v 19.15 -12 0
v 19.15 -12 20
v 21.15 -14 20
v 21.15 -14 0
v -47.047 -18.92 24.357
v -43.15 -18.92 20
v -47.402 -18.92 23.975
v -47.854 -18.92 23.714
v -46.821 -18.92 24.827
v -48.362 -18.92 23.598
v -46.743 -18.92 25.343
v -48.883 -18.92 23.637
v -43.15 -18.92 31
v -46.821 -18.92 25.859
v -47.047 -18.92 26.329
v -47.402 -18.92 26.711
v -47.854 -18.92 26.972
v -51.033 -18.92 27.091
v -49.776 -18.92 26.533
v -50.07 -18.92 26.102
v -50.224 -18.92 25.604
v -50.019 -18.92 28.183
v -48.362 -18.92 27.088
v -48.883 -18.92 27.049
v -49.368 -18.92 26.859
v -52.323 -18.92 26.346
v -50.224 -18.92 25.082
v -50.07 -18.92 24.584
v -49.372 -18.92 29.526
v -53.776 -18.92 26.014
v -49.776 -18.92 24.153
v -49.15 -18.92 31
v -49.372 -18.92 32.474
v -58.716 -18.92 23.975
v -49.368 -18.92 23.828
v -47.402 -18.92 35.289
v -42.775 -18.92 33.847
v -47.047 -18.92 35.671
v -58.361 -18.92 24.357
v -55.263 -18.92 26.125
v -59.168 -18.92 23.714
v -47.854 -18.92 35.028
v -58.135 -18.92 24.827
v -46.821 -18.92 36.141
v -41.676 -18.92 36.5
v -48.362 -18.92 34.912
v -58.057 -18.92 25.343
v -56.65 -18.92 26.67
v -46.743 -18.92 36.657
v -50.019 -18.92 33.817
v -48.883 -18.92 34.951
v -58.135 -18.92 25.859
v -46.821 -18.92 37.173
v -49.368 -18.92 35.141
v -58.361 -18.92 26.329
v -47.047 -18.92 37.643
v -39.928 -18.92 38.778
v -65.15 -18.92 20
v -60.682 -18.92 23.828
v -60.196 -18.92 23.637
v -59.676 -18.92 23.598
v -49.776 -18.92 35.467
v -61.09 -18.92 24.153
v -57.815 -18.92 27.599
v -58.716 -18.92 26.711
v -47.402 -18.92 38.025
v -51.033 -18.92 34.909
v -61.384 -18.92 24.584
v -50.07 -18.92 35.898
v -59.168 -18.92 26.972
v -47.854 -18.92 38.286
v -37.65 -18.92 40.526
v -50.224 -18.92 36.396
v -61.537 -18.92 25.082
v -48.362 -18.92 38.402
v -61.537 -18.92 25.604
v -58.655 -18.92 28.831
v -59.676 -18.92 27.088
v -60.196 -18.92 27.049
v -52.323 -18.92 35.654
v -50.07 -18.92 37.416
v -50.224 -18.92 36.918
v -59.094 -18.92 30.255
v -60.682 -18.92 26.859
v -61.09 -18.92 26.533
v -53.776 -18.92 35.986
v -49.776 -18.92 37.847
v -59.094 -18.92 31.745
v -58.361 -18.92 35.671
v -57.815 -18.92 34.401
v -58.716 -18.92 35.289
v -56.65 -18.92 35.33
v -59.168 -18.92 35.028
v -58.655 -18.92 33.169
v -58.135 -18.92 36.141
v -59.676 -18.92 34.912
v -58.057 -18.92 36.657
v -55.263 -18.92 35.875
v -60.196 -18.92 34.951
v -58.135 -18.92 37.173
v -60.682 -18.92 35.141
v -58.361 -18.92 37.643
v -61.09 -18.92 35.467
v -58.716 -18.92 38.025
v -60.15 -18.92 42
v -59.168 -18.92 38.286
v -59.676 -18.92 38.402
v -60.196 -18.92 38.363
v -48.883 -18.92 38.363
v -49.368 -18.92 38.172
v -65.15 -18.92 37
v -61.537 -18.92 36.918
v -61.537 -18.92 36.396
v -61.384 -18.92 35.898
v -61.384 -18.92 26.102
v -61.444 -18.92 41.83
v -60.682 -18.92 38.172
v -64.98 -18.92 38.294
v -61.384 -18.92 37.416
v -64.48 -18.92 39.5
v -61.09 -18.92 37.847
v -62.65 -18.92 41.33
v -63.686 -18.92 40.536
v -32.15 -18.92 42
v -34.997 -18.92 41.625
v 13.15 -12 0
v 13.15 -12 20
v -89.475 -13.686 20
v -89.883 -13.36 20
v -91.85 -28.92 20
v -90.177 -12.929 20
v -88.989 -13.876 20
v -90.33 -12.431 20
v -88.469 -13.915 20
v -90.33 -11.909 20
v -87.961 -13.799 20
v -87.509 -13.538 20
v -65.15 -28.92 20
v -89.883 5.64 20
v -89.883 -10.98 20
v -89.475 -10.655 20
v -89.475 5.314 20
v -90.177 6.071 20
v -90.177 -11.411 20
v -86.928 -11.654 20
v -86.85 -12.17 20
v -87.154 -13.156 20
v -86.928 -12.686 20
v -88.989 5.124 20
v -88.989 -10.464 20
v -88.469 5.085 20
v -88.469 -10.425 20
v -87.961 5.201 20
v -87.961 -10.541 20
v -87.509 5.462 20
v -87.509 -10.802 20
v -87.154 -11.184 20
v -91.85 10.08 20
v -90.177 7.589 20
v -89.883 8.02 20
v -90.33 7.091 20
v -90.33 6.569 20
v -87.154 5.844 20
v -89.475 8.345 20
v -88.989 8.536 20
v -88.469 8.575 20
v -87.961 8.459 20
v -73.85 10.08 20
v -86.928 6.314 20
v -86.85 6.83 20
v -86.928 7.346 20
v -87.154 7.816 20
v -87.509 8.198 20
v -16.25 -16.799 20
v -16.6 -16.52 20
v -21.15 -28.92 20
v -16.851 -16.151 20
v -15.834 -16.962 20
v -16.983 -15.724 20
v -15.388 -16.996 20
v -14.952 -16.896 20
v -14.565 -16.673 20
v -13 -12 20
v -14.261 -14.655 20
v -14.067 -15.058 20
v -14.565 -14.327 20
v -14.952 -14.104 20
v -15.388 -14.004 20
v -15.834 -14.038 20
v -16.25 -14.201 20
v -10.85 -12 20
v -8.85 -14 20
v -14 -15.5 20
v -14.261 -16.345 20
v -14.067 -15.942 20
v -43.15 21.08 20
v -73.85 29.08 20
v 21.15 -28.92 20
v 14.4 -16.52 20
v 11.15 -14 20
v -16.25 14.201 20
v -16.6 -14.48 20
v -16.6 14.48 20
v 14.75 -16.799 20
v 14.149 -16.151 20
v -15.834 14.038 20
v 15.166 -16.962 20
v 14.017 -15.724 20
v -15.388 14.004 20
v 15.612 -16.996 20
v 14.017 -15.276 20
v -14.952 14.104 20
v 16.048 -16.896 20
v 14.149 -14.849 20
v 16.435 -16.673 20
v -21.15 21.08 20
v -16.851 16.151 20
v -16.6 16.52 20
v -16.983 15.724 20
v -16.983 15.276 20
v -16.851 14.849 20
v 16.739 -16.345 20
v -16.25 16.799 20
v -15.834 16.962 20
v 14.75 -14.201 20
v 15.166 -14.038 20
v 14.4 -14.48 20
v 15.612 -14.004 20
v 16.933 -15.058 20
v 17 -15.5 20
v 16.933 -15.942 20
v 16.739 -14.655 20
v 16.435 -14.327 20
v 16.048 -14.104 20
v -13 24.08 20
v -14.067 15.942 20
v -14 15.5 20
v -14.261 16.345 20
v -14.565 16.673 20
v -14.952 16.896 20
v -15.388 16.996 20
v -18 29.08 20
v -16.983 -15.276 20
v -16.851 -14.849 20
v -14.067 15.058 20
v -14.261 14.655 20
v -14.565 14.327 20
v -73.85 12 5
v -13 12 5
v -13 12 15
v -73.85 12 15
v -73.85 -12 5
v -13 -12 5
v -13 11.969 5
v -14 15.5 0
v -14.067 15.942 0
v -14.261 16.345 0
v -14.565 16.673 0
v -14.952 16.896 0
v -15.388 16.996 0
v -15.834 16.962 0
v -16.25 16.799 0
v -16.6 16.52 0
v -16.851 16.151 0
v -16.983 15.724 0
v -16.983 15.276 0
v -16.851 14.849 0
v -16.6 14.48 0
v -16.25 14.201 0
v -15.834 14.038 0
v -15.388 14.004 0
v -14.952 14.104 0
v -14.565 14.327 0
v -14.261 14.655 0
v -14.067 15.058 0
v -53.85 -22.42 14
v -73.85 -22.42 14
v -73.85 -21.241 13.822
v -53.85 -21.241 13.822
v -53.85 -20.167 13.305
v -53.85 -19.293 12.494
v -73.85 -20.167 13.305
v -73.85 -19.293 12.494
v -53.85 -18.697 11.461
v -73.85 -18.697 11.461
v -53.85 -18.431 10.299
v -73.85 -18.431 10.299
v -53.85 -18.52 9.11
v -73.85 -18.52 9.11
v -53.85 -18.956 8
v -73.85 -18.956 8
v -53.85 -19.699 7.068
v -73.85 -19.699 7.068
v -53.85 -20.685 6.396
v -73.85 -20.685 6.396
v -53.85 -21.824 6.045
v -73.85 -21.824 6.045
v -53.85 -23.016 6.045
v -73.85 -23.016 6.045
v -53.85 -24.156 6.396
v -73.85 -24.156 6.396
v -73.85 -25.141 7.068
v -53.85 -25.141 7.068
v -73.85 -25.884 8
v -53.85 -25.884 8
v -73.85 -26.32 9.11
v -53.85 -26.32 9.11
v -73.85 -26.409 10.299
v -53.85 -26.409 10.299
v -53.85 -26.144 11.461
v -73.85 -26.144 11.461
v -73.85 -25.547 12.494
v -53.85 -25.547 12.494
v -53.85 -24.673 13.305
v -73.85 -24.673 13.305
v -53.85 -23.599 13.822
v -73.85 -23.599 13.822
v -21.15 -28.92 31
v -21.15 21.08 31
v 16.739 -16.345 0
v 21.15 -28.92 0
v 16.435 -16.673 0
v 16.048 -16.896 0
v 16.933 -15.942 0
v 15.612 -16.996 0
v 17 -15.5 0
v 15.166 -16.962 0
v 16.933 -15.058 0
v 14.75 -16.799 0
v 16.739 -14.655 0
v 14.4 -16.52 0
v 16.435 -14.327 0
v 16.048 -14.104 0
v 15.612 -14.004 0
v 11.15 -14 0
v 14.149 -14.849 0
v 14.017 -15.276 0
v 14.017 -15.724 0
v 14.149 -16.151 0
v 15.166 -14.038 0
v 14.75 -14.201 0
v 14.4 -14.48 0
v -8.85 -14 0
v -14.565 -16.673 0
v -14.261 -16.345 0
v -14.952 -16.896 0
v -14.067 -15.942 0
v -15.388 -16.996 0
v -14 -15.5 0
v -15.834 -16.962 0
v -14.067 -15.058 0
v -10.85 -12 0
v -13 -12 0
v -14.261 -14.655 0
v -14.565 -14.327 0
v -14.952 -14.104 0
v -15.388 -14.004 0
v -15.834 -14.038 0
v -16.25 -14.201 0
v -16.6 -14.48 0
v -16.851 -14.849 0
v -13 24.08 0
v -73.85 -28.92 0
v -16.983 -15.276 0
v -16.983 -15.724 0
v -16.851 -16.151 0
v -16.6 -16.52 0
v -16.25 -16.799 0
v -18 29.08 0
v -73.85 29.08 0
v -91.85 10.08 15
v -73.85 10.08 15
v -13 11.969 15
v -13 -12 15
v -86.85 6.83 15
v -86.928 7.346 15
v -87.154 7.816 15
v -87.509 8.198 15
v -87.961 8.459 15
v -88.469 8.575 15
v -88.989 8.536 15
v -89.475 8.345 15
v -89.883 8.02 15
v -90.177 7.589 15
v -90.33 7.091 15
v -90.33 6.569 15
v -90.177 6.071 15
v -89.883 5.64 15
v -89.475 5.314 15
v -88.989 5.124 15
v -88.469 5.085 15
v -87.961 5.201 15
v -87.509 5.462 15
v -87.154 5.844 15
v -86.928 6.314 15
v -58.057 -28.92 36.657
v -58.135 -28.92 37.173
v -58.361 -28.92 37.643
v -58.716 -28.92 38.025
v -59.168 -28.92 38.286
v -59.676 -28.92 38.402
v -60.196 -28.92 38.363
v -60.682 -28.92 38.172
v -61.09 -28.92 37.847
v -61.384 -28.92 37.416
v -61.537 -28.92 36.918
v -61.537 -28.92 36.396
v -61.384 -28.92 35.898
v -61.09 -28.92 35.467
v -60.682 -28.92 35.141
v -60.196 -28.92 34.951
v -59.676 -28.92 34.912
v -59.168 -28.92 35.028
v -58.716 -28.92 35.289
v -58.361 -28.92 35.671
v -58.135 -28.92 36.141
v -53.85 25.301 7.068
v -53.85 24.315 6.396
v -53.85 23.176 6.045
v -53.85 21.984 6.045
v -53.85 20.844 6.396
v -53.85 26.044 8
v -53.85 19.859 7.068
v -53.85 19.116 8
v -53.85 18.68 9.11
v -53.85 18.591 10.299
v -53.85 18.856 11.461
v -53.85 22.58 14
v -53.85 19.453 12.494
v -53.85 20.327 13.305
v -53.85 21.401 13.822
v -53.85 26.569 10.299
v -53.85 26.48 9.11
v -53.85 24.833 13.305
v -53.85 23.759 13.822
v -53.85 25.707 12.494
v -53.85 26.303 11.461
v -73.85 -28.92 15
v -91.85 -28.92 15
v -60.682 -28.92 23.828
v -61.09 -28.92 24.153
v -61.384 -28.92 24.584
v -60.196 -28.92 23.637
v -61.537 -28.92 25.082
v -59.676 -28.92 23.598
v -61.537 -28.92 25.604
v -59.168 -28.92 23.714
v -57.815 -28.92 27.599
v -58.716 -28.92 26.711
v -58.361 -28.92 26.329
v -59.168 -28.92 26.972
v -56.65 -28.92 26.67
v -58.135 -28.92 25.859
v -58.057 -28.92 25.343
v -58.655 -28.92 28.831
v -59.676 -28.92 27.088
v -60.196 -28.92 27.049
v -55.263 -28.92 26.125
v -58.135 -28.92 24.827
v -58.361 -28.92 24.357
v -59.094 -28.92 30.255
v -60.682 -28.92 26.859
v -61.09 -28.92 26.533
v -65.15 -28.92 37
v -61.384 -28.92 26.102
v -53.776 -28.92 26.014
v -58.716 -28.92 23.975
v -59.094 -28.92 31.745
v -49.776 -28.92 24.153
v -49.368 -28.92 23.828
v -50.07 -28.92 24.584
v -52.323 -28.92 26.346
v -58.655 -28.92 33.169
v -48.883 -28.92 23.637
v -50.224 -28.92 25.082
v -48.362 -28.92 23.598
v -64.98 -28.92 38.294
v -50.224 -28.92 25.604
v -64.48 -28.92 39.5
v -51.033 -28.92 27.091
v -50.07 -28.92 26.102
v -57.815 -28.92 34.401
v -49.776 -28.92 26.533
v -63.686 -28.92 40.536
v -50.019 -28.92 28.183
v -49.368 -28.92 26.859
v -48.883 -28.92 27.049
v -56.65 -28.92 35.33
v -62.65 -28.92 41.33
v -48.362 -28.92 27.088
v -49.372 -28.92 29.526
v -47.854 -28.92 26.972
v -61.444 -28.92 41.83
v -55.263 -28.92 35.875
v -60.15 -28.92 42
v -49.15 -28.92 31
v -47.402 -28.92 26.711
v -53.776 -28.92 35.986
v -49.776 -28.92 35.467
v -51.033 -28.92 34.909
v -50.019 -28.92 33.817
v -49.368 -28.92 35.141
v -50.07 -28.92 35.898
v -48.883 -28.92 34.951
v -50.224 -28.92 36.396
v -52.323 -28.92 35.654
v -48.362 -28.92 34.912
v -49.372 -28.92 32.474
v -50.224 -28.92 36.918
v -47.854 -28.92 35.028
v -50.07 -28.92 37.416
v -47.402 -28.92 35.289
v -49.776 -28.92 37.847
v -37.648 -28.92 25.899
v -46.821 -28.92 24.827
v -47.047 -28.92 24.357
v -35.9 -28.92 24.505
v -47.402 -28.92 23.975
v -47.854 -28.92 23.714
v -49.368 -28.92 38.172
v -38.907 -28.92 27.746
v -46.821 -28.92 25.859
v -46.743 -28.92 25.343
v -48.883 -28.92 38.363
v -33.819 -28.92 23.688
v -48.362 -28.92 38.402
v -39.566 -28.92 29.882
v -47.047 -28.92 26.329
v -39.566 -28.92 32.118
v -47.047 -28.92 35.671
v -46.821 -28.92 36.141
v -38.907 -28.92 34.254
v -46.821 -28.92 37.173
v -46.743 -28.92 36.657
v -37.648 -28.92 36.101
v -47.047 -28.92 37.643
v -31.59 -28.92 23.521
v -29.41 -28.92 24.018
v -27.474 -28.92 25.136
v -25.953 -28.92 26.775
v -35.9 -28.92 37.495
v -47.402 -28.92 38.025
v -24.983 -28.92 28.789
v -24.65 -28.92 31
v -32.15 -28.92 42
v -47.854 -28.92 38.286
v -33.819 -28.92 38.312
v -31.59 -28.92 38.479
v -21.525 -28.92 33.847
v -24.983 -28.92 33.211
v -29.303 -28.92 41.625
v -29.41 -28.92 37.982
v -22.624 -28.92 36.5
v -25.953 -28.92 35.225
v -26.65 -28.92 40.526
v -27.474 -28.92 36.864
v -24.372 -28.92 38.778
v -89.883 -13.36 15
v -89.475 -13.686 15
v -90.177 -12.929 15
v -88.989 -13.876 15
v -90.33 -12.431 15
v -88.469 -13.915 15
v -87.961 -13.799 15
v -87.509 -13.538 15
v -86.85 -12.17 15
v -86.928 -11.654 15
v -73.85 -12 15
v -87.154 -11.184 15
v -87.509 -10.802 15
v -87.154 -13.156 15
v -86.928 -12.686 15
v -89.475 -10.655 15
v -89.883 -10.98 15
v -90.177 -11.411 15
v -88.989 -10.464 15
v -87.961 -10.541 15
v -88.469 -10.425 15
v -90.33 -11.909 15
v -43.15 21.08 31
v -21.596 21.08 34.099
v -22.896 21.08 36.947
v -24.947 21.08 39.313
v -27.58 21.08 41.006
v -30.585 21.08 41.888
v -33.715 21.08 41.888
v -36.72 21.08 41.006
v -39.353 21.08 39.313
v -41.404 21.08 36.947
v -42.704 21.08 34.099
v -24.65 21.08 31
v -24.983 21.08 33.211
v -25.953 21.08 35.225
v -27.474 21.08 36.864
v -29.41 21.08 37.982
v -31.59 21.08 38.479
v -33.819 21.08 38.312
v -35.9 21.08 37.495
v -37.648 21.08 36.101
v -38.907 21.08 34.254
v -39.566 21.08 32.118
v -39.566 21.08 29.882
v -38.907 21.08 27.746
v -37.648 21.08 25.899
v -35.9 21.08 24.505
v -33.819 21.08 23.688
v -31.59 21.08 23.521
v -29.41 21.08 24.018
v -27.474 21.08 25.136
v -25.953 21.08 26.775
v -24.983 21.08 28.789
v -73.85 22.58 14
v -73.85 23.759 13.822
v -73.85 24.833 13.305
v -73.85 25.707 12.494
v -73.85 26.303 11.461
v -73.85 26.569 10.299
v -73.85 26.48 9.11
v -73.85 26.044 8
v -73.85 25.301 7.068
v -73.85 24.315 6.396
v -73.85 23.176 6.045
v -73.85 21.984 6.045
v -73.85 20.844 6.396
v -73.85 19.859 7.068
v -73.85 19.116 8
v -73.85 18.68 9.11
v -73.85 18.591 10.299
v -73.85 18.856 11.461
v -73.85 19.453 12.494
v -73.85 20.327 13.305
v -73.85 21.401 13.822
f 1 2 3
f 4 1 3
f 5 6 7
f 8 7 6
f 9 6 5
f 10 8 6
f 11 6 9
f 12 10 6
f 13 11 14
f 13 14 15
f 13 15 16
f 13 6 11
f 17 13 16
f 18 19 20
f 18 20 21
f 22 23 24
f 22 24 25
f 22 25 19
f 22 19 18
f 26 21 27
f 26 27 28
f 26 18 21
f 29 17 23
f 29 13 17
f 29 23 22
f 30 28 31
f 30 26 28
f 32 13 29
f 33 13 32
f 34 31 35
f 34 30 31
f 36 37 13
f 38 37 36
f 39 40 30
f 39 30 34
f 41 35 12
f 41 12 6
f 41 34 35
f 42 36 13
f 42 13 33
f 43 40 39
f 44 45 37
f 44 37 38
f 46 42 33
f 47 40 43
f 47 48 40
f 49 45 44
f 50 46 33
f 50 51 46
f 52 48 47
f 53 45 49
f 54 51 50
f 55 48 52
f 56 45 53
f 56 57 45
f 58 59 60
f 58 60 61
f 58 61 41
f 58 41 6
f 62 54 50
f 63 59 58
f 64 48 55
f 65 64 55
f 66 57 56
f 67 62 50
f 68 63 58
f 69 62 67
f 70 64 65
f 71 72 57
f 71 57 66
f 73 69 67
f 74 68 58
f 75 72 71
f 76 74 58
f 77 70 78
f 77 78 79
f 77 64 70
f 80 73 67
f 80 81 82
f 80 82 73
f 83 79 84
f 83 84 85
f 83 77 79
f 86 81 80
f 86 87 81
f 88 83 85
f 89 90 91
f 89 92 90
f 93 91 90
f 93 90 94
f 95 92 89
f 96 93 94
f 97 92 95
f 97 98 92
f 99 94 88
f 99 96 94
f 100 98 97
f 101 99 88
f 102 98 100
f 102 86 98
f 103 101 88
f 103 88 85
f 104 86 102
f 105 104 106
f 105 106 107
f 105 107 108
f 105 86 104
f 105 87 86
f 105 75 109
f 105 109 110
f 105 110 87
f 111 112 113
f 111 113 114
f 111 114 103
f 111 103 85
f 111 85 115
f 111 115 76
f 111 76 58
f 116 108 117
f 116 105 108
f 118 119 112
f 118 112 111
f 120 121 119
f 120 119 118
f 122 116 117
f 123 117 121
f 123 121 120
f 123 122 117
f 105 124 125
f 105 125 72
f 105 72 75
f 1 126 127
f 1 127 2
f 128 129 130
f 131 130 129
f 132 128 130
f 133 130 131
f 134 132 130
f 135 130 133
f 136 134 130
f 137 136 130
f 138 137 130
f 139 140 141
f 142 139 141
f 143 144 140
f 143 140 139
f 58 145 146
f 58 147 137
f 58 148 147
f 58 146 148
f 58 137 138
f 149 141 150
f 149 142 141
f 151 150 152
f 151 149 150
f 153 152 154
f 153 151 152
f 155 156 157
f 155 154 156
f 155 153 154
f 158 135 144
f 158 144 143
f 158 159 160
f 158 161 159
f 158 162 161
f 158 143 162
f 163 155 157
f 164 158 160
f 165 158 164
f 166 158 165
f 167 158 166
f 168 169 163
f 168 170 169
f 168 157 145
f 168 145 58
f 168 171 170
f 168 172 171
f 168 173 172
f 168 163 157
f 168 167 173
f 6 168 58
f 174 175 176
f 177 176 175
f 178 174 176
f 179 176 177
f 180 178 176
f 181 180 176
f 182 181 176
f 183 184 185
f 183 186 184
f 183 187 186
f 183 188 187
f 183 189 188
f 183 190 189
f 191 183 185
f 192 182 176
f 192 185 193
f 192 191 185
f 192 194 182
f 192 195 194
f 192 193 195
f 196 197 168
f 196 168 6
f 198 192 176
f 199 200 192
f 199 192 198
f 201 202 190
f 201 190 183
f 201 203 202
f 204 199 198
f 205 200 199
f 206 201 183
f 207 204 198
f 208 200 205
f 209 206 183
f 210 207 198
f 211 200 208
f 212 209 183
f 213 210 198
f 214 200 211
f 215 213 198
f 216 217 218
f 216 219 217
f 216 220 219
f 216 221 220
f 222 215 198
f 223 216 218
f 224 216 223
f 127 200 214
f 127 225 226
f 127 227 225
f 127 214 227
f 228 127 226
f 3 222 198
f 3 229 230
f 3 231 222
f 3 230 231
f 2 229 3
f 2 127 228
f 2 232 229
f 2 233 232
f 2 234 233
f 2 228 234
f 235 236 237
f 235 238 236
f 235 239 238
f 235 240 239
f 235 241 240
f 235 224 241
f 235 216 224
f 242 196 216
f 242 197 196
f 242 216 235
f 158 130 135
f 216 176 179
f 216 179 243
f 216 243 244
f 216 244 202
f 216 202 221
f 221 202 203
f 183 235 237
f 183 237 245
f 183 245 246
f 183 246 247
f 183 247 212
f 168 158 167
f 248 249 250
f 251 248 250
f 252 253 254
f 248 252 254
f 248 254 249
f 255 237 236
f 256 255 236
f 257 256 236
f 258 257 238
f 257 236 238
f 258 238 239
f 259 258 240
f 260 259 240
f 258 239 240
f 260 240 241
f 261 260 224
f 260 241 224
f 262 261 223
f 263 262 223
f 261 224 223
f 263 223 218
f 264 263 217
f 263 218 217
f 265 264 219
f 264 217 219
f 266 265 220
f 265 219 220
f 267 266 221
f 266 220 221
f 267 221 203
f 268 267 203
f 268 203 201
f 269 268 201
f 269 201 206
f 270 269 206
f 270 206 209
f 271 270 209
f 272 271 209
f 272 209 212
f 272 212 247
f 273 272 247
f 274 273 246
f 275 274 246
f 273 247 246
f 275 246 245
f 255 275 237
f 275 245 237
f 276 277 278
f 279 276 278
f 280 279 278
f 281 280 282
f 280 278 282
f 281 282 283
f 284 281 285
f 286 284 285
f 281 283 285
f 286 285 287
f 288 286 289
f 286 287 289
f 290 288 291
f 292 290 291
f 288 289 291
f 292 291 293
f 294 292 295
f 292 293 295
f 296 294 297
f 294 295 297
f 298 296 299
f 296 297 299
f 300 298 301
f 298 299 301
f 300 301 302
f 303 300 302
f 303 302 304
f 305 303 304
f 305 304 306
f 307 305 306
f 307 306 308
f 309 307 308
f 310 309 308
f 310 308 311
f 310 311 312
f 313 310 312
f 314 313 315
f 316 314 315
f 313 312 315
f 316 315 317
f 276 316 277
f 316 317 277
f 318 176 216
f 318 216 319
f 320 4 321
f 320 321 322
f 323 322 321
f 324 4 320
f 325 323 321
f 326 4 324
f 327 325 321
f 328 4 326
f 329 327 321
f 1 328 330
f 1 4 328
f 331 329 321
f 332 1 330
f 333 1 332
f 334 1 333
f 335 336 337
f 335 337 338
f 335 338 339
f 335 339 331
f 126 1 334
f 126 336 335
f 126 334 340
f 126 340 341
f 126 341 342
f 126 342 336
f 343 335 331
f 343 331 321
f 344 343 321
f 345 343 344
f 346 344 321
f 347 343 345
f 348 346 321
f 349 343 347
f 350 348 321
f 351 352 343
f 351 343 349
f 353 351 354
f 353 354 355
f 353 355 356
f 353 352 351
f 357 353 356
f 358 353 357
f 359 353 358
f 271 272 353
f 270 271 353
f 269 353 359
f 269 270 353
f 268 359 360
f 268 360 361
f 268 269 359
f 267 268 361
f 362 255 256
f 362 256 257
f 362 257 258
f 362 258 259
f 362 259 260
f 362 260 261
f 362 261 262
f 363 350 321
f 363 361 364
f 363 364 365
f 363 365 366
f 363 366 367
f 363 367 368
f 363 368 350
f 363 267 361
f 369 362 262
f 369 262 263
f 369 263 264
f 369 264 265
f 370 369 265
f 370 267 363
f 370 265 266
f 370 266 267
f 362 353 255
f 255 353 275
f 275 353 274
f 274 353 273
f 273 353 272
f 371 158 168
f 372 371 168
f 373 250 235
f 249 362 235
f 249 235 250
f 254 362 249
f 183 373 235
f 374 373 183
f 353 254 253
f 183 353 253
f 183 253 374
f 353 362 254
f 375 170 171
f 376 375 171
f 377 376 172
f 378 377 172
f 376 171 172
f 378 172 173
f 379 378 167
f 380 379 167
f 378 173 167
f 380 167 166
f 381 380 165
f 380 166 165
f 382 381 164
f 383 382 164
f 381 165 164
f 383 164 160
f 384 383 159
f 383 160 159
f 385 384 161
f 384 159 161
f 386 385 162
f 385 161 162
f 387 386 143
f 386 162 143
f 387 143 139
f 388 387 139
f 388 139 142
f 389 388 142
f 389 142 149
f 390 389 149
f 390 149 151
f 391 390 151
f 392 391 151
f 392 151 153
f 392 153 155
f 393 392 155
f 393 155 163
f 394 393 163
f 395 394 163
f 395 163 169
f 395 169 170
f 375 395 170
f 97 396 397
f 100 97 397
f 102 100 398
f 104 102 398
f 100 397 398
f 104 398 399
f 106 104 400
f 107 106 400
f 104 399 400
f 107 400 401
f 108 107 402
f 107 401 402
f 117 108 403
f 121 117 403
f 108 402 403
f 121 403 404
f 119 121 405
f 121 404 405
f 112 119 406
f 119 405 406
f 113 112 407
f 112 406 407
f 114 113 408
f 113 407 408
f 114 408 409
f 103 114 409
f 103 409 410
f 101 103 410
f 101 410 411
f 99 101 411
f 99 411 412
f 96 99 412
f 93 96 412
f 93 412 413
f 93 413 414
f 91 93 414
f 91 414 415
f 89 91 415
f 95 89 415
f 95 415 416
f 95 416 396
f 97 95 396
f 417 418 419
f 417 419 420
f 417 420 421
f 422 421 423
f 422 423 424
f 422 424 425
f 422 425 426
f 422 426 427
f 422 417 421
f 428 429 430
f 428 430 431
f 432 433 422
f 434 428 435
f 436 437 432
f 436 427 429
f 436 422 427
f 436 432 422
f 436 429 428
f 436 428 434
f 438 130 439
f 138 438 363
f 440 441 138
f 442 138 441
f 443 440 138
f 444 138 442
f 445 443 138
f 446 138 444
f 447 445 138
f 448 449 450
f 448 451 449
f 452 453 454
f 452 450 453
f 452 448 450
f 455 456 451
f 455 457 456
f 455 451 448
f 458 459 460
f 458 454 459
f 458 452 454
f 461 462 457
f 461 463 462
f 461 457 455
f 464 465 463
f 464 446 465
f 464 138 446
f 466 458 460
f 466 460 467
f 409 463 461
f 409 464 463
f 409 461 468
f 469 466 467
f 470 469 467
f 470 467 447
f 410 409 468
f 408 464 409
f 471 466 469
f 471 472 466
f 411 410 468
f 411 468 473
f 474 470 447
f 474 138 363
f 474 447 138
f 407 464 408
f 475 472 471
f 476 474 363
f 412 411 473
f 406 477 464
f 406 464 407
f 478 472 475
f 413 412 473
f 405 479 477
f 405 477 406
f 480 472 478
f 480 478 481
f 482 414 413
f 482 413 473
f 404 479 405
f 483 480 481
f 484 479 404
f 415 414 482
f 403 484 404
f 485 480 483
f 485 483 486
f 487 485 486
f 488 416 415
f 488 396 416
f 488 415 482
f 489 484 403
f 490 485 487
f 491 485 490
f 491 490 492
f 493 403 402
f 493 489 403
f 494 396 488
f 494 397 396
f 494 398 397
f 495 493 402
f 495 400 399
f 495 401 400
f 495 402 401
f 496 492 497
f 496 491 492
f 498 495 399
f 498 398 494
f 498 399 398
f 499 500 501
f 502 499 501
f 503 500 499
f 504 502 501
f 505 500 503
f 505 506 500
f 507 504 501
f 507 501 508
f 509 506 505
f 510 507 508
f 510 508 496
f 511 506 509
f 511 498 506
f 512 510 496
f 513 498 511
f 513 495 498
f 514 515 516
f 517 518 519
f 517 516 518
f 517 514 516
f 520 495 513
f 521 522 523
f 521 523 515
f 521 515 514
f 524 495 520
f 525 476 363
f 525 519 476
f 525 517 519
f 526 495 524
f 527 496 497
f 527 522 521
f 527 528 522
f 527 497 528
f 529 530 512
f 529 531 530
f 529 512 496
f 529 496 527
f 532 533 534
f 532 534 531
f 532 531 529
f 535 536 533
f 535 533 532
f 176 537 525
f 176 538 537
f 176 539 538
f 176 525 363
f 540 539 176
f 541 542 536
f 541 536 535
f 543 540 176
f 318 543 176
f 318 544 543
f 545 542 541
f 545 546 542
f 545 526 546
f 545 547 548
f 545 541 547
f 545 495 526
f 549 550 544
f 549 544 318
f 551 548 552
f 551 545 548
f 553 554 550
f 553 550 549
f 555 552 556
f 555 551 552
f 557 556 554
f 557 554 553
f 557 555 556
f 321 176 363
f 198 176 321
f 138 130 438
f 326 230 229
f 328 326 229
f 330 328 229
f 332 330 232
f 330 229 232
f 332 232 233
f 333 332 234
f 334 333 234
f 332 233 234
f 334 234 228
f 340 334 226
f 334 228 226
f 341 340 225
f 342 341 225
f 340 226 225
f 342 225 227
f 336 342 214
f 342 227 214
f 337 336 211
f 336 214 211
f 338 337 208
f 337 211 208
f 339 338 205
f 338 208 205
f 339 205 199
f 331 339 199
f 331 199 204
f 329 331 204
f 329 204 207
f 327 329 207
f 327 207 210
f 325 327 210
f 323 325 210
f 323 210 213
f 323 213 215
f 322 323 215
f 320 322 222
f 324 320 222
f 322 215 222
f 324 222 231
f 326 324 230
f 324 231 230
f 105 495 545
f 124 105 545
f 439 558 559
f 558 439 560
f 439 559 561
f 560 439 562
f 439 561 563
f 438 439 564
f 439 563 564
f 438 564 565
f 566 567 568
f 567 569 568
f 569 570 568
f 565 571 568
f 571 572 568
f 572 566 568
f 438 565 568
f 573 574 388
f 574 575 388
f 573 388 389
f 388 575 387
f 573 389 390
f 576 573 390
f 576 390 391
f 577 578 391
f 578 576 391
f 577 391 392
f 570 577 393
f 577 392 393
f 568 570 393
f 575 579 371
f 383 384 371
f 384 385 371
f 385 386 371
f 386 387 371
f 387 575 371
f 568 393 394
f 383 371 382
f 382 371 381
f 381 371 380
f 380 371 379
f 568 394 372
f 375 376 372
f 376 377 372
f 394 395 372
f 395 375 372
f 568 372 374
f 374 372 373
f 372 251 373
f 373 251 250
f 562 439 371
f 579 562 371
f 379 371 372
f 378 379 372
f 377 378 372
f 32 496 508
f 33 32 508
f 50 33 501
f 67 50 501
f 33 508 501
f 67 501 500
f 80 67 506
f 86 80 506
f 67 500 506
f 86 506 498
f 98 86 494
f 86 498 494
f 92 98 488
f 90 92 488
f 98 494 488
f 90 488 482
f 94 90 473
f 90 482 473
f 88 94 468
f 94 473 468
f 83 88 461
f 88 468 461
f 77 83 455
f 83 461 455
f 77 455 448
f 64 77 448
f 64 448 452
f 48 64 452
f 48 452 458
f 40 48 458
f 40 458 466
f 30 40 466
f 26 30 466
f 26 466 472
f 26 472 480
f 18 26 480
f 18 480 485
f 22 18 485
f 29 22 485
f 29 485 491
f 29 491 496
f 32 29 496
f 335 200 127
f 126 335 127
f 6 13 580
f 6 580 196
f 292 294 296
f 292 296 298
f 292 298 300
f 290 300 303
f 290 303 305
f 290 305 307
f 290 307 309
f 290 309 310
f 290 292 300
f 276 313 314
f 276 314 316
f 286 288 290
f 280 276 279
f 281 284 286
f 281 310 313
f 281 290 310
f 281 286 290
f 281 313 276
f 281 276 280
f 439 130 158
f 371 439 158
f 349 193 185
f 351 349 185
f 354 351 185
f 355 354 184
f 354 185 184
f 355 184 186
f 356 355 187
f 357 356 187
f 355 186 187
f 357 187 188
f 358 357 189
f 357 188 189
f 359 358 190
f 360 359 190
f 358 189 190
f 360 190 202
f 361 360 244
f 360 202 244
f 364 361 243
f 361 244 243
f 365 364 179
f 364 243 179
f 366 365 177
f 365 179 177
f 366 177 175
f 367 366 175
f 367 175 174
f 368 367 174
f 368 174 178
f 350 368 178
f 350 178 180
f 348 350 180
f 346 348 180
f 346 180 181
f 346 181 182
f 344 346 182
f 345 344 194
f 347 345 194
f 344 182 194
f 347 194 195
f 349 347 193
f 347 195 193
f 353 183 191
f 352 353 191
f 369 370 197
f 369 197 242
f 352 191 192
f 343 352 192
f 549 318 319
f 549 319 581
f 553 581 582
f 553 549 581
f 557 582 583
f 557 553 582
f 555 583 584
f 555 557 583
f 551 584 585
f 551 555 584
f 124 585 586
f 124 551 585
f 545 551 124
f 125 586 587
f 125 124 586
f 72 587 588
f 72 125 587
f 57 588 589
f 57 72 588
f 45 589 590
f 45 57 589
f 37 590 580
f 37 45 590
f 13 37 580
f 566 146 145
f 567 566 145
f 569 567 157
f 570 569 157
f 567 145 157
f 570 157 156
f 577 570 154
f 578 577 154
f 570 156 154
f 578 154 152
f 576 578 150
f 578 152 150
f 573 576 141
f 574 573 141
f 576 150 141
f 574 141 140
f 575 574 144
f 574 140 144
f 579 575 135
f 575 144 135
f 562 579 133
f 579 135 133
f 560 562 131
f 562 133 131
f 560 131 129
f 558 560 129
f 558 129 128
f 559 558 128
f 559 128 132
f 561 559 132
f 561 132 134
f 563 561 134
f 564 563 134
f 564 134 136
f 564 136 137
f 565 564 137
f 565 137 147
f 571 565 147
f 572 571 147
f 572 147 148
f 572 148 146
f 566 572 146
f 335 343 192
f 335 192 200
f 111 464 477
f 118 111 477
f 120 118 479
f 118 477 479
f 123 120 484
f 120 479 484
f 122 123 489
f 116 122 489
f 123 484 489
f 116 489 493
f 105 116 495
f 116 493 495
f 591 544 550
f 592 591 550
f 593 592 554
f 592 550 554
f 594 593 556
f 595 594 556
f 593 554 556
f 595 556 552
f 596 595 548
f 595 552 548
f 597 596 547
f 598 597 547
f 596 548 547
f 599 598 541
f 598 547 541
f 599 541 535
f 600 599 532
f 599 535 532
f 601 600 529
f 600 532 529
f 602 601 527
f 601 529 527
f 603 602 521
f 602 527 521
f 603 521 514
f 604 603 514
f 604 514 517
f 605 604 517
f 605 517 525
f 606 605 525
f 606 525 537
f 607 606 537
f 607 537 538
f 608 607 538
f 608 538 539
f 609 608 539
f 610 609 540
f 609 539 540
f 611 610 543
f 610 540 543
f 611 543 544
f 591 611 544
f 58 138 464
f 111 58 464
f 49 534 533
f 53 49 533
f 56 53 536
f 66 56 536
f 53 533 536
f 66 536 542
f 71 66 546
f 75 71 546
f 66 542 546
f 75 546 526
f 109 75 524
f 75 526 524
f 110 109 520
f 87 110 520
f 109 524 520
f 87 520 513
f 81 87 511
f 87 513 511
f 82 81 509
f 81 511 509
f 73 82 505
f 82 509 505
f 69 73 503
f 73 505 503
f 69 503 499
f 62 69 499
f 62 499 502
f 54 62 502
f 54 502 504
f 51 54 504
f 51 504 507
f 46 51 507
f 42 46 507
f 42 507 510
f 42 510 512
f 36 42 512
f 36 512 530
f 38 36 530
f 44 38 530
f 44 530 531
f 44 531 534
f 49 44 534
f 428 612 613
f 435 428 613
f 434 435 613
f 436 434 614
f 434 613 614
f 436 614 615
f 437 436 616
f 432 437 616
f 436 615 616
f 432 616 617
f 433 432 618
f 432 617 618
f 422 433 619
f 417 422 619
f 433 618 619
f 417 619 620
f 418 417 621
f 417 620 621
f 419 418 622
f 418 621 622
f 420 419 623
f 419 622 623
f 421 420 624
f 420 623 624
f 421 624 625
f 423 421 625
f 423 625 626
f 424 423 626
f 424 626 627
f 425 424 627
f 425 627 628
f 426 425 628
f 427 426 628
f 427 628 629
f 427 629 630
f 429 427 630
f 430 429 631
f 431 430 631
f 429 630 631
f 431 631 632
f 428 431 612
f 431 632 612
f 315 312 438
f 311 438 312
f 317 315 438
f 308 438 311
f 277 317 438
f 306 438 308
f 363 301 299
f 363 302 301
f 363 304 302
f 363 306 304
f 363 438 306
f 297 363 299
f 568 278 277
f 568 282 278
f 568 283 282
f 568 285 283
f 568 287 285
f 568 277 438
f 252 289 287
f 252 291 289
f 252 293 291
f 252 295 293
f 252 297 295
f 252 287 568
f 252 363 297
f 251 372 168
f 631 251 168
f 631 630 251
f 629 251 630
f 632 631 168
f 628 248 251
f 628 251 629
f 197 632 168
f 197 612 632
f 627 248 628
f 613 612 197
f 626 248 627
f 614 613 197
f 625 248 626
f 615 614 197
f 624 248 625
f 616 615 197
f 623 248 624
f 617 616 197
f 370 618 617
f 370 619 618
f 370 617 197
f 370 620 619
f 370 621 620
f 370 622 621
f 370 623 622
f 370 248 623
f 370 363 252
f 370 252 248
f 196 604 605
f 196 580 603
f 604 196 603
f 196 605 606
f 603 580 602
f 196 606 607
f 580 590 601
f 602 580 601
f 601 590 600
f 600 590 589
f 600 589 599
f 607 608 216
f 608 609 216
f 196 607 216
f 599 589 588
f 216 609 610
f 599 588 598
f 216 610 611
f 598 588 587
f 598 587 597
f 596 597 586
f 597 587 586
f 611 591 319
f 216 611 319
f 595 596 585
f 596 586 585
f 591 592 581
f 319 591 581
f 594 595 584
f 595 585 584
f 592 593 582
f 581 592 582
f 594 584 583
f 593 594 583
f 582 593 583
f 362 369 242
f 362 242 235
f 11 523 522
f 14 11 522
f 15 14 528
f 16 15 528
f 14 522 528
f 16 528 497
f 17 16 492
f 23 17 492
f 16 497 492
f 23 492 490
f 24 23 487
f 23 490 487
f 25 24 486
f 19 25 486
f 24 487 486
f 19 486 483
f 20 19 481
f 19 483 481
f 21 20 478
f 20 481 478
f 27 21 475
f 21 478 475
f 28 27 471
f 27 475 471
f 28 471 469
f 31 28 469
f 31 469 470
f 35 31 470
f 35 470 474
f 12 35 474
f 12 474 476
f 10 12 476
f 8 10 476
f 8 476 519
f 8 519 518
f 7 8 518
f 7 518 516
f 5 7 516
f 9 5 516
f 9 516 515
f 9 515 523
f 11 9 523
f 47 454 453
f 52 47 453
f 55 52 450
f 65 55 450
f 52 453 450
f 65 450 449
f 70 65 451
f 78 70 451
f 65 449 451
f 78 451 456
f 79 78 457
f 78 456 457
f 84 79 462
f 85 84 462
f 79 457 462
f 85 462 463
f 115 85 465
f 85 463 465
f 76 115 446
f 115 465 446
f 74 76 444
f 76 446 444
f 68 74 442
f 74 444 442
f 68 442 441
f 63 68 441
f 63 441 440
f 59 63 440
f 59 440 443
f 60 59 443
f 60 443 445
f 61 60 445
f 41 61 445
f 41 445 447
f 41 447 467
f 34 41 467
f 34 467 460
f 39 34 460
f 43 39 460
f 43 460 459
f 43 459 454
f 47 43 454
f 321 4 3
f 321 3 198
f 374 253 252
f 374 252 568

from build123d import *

# Parameters (mm, degrees)
EXTRUDE_1_DEPTH     = 20
SKETCH_2_R          = 1.5
CUT_EXTRUDE_1_DEPTH = 20
SKETCH_3_R          = 7.5
EXTRUDE_2_DEPTH     = 50
EXTRUDE_3_DEPTH     = 10
SKETCH_7_W          = 18
SKETCH_7_H          = 39
EXTRUDE_4_DEPTH     = 5
SKETCH_9_R          = 5
SKETCH_9_R_2        = 1.75
CUT_EXTRUDE_2_DEPTH = 15
SKETCH_12_R         = 4
CUT_EXTRUDE_3_DEPTH = 20
CUT_EXTRUDE_START   = -60.849857
SKETCH_13_W         = 10
SKETCH_13_H         = 24
CUT_EXTRUDE_4_DEPTH = 60.849857
SKETCH_14_R         = 1.75
CUT_EXTRUDE_5_DEPTH = 10


with BuildPart() as part:
    # 草图1 → 凸台-拉伸1 (new body)
    with BuildSketch(Plane.XY):
        Polygon((-18, 29.079835166), (-13.000041786, 24.079835166), (-13.000343311, -12.000164834), (-10.85, -12.000164834), (-8.85, -14.000164834), (11.15, -14.000164834), (13.15, -12.000164834), (19.15, -12.000164834), (21.15, -14.000164834), (21.15, -28.920164834), (-73.85, -28.920164834), (-73.85, 29.079835166), align=None)
    extrude(amount=EXTRUDE_1_DEPTH)

    # 草图2 → 切除-拉伸1 (cut)
    with BuildSketch(Plane.XY.offset(20)):
        with Locations((-15.5, 15.5)):
            Circle(SKETCH_2_R)
        with Locations((-15.5, -15.5)):
            Circle(SKETCH_2_R)
        with Locations((15.5, -15.5)):
            Circle(SKETCH_2_R)
    extrude(amount=-CUT_EXTRUDE_1_DEPTH, mode=Mode.SUBTRACT)

    # 草图3 → 凸台-拉伸2 (add)
    with BuildSketch(Plane.XZ.offset(28.920164834)):
        with BuildLine():
            Line((-43.15, 31), (-43.15, 20))
            Line((-43.15, 20), (-21.15, 20))
            Line((-21.15, 20), (-21.15, 31))
            ThreePointArc((-21.15, 31), (-32.15, 42), (-43.15, 31))
        make_face()
        with Locations((-32.15, 31)):
            Circle(SKETCH_3_R, mode=Mode.SUBTRACT)
    extrude(amount=-EXTRUDE_2_DEPTH)

    # 草图5 → 凸台-拉伸3 (add)
    with BuildSketch(Plane.XZ.offset(28.920164834)):
        with BuildLine():
            Line((-43.15, 42), (-32.15, 42))
            ThreePointArc((-32.15, 42), (-39.928174593, 38.778174593), (-43.15, 31))
            Line((-43.15, 31), (-43.15, 20))
            Line((-43.15, 20), (-65.15, 20))
            Line((-65.15, 20), (-65.15, 37))
            ThreePointArc((-65.15, 37), (-63.685533906, 40.535533906), (-60.15, 42))
            Line((-60.15, 42), (-43.15, 42))
        make_face()
    extrude(amount=-EXTRUDE_3_DEPTH)

    # 草图7 → 凸台-拉伸4 (add)
    with BuildSketch(Plane.XY.offset(20)):
        with Locations((-82.85, -9.420164834)):
            Rectangle(SKETCH_7_W, SKETCH_7_H)
    extrude(amount=-EXTRUDE_4_DEPTH)

    # 草图9 → 切除-拉伸2 (cut)
    with BuildSketch(Plane.XZ.offset(28.920164834)):
        with Locations((-54.15, 31)):
            Circle(SKETCH_9_R)
        with Locations((-59.806854249, 36.656854249)):
            Circle(SKETCH_9_R_2)
        with Locations((-48.493145751, 36.656854249)):
            Circle(SKETCH_9_R_2)
        with Locations((-48.493145751, 25.343145751)):
            Circle(SKETCH_9_R_2)
        with Locations((-59.806854249, 25.343145751)):
            Circle(SKETCH_9_R_2)
    extrude(amount=-CUT_EXTRUDE_2_DEPTH, mode=Mode.SUBTRACT)

    # 草图12 → 切除-拉伸3 (cut)
    with BuildSketch(Plane.ZY.offset(73.85)):
        with Locations((10, 22.579835166)):
            Circle(SKETCH_12_R)
        with Locations((10, -22.420164834)):
            Circle(SKETCH_12_R)
    extrude(amount=-CUT_EXTRUDE_3_DEPTH, mode=Mode.SUBTRACT)

    # 草图13 → 切除-拉伸4 (cut)
    with BuildSketch(Plane.ZY.offset(73.85).offset(CUT_EXTRUDE_START)):
        with Locations((10, 0)):
            Rectangle(SKETCH_13_W, SKETCH_13_H)
    extrude(amount=CUT_EXTRUDE_4_DEPTH, mode=Mode.SUBTRACT)

    # 草图14 → 切除-拉伸5 (cut)
    with BuildSketch(Plane.XY.offset(20)):
        with Locations((-88.6, -12.170164834)):
            Circle(SKETCH_14_R)
        with Locations((-88.6, 6.829835166)):
            Circle(SKETCH_14_R)
    extrude(amount=-CUT_EXTRUDE_5_DEPTH, mode=Mode.SUBTRACT)


solid = part.part
